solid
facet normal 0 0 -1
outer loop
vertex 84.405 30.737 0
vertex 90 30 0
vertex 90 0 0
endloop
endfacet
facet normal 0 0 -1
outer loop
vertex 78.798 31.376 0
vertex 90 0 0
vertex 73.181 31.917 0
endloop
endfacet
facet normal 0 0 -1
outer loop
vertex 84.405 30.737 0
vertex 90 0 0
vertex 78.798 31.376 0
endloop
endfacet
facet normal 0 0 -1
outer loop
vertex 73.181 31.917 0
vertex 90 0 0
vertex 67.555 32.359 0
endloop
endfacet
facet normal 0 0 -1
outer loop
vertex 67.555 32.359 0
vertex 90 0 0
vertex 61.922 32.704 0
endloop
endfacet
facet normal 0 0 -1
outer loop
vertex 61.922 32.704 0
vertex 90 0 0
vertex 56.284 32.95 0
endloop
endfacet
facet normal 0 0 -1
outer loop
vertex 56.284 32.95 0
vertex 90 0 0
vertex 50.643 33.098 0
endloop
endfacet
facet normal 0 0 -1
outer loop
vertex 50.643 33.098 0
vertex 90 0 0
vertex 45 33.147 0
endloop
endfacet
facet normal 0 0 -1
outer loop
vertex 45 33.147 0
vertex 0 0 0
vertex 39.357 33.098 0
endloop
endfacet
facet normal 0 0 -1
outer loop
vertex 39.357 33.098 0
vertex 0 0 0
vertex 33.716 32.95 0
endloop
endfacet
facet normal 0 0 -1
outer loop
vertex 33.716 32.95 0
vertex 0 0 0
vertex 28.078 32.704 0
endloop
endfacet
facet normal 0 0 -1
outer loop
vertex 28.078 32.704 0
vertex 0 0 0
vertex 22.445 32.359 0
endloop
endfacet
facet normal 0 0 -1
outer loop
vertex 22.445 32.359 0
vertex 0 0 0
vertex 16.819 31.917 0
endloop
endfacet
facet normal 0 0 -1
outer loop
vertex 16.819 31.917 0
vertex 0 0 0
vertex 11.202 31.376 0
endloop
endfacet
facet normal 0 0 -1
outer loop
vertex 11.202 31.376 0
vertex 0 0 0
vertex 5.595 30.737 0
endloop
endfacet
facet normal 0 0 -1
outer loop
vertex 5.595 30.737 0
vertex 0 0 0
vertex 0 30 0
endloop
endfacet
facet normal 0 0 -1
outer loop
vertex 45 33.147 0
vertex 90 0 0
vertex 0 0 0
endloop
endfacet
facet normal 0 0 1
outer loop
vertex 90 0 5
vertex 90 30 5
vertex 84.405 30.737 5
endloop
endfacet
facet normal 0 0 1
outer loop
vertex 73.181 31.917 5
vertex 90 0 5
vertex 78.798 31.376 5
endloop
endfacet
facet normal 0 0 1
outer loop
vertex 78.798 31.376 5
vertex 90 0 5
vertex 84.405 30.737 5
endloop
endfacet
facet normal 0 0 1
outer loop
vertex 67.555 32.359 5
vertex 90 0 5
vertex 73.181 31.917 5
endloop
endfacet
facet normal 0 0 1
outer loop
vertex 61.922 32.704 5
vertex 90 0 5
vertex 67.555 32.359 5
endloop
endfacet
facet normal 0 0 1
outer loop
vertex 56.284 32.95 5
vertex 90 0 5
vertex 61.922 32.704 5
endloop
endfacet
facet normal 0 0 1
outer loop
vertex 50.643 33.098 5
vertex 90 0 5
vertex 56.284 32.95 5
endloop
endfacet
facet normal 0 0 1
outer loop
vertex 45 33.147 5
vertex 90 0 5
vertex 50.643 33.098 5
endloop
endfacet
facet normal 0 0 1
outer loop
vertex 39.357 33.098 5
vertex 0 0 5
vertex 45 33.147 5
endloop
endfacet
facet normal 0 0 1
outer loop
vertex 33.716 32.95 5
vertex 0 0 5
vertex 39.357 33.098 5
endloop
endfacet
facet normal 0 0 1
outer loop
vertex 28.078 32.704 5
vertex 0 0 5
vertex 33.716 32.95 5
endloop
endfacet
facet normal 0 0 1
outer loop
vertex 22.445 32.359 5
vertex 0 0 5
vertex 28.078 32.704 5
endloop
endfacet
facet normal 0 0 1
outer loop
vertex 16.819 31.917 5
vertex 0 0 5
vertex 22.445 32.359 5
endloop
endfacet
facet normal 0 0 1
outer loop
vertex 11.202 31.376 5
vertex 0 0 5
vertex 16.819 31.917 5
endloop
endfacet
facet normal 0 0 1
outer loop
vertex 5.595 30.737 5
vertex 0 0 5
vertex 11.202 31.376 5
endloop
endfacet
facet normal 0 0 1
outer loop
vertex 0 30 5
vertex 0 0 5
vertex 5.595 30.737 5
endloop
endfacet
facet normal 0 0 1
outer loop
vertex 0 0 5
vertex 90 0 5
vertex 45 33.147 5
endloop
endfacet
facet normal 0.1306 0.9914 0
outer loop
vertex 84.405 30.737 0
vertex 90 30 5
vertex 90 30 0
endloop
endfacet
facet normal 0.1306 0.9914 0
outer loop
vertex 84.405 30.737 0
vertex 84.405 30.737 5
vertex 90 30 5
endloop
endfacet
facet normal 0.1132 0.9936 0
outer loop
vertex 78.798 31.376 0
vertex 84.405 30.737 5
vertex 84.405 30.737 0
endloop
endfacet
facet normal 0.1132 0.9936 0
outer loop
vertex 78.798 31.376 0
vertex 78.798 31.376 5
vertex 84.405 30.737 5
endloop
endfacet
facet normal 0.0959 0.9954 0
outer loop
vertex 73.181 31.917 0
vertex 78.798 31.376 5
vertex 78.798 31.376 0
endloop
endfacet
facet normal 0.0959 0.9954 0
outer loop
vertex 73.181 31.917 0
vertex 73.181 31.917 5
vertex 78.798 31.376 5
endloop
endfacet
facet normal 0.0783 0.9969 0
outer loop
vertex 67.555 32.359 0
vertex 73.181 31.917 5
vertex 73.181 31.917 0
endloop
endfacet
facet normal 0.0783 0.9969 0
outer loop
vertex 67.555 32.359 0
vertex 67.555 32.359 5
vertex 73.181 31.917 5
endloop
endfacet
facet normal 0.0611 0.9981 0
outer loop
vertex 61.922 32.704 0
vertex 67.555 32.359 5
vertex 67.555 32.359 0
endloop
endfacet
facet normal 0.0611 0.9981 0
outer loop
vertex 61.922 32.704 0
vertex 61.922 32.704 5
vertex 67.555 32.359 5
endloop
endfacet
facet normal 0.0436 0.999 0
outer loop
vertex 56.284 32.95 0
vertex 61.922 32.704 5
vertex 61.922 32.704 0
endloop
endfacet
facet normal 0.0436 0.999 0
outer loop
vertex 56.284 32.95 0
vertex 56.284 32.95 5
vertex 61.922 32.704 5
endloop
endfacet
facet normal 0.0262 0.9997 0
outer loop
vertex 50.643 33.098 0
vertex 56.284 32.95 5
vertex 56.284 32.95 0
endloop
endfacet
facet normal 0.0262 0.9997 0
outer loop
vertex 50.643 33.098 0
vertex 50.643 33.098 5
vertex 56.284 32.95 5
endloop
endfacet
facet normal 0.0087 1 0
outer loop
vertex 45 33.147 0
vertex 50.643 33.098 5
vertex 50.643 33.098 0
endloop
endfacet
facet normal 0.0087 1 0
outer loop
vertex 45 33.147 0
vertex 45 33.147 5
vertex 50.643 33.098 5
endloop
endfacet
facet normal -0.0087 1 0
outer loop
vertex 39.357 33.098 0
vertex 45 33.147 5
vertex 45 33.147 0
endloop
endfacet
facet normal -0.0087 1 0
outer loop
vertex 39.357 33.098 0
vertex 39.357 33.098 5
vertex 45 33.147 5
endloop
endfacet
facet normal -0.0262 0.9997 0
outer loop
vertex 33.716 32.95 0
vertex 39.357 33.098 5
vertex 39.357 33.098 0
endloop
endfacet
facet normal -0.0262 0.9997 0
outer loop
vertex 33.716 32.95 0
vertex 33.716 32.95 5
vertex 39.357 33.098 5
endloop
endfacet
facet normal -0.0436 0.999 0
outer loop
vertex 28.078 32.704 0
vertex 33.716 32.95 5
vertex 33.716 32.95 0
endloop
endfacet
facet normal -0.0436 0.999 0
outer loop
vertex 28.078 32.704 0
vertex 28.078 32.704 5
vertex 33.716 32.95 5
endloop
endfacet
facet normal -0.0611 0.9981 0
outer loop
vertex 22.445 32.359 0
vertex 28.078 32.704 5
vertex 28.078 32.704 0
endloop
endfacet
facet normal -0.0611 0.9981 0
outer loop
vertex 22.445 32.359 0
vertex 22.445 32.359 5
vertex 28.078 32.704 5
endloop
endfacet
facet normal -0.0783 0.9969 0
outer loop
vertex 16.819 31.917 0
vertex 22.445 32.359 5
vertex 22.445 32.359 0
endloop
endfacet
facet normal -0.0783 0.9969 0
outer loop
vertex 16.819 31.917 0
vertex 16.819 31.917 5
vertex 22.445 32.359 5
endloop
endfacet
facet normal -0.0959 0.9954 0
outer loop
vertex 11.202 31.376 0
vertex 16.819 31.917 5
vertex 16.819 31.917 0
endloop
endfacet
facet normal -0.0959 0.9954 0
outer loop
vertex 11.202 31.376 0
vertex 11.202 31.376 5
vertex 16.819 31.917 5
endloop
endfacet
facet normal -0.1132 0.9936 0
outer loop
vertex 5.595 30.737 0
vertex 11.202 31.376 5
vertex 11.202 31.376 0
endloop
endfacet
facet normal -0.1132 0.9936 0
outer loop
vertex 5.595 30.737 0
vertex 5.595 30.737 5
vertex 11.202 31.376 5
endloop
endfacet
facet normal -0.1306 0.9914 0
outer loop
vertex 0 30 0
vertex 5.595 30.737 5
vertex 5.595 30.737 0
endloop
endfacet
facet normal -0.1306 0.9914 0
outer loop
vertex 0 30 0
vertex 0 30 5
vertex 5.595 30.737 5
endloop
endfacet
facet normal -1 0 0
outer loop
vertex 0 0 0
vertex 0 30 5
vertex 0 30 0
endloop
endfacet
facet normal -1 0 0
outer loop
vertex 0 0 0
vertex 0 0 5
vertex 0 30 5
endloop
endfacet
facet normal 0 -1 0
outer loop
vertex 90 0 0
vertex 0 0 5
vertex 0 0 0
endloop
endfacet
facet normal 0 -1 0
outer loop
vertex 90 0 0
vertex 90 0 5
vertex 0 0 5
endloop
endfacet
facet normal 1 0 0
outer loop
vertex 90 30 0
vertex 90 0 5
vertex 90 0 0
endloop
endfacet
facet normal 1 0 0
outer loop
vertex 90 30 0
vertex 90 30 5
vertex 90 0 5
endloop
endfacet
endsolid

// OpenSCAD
$fn = 32;

// ----------------------------------------------------------------------
// Arc profile plate: crown, 19 points
// ----------------------------------------------------------------------

// --- parameters (mm) ---
bar_l = 90;               // bar length, X
bar_w = 30;               // bar height at the ends, Y
arc_r = 323.34;           // radius of the crown arc
arc_angle = 16;           // crown arc angle, degrees
crown_rise = 3.15;        // rise of the crown over the ends
arc_step = 1;             // sampling step of the crown arc, degrees
plate_t = 5;              // plate thickness, Z

bbox_y = bar_w + crown_rise;  // full height with the crown

profile = [[90, 30], [84.405, 30.737], [78.798, 31.376], [73.181, 31.917], [67.555, 32.359], [61.922, 32.704], [56.284, 32.95], [50.643, 33.098], [45, 33.147], [39.357, 33.098], [33.716, 32.95], [28.078, 32.704], [22.445, 32.359], [16.819, 31.917], [11.202, 31.376], [5.595, 30.737], [0, 30], [0, 0], [90, 0]];  // primary outline, 19 points, counter clockwise

// --- the one profile operation ---
linear_extrude(height = plate_t) polygon(points = profile);
